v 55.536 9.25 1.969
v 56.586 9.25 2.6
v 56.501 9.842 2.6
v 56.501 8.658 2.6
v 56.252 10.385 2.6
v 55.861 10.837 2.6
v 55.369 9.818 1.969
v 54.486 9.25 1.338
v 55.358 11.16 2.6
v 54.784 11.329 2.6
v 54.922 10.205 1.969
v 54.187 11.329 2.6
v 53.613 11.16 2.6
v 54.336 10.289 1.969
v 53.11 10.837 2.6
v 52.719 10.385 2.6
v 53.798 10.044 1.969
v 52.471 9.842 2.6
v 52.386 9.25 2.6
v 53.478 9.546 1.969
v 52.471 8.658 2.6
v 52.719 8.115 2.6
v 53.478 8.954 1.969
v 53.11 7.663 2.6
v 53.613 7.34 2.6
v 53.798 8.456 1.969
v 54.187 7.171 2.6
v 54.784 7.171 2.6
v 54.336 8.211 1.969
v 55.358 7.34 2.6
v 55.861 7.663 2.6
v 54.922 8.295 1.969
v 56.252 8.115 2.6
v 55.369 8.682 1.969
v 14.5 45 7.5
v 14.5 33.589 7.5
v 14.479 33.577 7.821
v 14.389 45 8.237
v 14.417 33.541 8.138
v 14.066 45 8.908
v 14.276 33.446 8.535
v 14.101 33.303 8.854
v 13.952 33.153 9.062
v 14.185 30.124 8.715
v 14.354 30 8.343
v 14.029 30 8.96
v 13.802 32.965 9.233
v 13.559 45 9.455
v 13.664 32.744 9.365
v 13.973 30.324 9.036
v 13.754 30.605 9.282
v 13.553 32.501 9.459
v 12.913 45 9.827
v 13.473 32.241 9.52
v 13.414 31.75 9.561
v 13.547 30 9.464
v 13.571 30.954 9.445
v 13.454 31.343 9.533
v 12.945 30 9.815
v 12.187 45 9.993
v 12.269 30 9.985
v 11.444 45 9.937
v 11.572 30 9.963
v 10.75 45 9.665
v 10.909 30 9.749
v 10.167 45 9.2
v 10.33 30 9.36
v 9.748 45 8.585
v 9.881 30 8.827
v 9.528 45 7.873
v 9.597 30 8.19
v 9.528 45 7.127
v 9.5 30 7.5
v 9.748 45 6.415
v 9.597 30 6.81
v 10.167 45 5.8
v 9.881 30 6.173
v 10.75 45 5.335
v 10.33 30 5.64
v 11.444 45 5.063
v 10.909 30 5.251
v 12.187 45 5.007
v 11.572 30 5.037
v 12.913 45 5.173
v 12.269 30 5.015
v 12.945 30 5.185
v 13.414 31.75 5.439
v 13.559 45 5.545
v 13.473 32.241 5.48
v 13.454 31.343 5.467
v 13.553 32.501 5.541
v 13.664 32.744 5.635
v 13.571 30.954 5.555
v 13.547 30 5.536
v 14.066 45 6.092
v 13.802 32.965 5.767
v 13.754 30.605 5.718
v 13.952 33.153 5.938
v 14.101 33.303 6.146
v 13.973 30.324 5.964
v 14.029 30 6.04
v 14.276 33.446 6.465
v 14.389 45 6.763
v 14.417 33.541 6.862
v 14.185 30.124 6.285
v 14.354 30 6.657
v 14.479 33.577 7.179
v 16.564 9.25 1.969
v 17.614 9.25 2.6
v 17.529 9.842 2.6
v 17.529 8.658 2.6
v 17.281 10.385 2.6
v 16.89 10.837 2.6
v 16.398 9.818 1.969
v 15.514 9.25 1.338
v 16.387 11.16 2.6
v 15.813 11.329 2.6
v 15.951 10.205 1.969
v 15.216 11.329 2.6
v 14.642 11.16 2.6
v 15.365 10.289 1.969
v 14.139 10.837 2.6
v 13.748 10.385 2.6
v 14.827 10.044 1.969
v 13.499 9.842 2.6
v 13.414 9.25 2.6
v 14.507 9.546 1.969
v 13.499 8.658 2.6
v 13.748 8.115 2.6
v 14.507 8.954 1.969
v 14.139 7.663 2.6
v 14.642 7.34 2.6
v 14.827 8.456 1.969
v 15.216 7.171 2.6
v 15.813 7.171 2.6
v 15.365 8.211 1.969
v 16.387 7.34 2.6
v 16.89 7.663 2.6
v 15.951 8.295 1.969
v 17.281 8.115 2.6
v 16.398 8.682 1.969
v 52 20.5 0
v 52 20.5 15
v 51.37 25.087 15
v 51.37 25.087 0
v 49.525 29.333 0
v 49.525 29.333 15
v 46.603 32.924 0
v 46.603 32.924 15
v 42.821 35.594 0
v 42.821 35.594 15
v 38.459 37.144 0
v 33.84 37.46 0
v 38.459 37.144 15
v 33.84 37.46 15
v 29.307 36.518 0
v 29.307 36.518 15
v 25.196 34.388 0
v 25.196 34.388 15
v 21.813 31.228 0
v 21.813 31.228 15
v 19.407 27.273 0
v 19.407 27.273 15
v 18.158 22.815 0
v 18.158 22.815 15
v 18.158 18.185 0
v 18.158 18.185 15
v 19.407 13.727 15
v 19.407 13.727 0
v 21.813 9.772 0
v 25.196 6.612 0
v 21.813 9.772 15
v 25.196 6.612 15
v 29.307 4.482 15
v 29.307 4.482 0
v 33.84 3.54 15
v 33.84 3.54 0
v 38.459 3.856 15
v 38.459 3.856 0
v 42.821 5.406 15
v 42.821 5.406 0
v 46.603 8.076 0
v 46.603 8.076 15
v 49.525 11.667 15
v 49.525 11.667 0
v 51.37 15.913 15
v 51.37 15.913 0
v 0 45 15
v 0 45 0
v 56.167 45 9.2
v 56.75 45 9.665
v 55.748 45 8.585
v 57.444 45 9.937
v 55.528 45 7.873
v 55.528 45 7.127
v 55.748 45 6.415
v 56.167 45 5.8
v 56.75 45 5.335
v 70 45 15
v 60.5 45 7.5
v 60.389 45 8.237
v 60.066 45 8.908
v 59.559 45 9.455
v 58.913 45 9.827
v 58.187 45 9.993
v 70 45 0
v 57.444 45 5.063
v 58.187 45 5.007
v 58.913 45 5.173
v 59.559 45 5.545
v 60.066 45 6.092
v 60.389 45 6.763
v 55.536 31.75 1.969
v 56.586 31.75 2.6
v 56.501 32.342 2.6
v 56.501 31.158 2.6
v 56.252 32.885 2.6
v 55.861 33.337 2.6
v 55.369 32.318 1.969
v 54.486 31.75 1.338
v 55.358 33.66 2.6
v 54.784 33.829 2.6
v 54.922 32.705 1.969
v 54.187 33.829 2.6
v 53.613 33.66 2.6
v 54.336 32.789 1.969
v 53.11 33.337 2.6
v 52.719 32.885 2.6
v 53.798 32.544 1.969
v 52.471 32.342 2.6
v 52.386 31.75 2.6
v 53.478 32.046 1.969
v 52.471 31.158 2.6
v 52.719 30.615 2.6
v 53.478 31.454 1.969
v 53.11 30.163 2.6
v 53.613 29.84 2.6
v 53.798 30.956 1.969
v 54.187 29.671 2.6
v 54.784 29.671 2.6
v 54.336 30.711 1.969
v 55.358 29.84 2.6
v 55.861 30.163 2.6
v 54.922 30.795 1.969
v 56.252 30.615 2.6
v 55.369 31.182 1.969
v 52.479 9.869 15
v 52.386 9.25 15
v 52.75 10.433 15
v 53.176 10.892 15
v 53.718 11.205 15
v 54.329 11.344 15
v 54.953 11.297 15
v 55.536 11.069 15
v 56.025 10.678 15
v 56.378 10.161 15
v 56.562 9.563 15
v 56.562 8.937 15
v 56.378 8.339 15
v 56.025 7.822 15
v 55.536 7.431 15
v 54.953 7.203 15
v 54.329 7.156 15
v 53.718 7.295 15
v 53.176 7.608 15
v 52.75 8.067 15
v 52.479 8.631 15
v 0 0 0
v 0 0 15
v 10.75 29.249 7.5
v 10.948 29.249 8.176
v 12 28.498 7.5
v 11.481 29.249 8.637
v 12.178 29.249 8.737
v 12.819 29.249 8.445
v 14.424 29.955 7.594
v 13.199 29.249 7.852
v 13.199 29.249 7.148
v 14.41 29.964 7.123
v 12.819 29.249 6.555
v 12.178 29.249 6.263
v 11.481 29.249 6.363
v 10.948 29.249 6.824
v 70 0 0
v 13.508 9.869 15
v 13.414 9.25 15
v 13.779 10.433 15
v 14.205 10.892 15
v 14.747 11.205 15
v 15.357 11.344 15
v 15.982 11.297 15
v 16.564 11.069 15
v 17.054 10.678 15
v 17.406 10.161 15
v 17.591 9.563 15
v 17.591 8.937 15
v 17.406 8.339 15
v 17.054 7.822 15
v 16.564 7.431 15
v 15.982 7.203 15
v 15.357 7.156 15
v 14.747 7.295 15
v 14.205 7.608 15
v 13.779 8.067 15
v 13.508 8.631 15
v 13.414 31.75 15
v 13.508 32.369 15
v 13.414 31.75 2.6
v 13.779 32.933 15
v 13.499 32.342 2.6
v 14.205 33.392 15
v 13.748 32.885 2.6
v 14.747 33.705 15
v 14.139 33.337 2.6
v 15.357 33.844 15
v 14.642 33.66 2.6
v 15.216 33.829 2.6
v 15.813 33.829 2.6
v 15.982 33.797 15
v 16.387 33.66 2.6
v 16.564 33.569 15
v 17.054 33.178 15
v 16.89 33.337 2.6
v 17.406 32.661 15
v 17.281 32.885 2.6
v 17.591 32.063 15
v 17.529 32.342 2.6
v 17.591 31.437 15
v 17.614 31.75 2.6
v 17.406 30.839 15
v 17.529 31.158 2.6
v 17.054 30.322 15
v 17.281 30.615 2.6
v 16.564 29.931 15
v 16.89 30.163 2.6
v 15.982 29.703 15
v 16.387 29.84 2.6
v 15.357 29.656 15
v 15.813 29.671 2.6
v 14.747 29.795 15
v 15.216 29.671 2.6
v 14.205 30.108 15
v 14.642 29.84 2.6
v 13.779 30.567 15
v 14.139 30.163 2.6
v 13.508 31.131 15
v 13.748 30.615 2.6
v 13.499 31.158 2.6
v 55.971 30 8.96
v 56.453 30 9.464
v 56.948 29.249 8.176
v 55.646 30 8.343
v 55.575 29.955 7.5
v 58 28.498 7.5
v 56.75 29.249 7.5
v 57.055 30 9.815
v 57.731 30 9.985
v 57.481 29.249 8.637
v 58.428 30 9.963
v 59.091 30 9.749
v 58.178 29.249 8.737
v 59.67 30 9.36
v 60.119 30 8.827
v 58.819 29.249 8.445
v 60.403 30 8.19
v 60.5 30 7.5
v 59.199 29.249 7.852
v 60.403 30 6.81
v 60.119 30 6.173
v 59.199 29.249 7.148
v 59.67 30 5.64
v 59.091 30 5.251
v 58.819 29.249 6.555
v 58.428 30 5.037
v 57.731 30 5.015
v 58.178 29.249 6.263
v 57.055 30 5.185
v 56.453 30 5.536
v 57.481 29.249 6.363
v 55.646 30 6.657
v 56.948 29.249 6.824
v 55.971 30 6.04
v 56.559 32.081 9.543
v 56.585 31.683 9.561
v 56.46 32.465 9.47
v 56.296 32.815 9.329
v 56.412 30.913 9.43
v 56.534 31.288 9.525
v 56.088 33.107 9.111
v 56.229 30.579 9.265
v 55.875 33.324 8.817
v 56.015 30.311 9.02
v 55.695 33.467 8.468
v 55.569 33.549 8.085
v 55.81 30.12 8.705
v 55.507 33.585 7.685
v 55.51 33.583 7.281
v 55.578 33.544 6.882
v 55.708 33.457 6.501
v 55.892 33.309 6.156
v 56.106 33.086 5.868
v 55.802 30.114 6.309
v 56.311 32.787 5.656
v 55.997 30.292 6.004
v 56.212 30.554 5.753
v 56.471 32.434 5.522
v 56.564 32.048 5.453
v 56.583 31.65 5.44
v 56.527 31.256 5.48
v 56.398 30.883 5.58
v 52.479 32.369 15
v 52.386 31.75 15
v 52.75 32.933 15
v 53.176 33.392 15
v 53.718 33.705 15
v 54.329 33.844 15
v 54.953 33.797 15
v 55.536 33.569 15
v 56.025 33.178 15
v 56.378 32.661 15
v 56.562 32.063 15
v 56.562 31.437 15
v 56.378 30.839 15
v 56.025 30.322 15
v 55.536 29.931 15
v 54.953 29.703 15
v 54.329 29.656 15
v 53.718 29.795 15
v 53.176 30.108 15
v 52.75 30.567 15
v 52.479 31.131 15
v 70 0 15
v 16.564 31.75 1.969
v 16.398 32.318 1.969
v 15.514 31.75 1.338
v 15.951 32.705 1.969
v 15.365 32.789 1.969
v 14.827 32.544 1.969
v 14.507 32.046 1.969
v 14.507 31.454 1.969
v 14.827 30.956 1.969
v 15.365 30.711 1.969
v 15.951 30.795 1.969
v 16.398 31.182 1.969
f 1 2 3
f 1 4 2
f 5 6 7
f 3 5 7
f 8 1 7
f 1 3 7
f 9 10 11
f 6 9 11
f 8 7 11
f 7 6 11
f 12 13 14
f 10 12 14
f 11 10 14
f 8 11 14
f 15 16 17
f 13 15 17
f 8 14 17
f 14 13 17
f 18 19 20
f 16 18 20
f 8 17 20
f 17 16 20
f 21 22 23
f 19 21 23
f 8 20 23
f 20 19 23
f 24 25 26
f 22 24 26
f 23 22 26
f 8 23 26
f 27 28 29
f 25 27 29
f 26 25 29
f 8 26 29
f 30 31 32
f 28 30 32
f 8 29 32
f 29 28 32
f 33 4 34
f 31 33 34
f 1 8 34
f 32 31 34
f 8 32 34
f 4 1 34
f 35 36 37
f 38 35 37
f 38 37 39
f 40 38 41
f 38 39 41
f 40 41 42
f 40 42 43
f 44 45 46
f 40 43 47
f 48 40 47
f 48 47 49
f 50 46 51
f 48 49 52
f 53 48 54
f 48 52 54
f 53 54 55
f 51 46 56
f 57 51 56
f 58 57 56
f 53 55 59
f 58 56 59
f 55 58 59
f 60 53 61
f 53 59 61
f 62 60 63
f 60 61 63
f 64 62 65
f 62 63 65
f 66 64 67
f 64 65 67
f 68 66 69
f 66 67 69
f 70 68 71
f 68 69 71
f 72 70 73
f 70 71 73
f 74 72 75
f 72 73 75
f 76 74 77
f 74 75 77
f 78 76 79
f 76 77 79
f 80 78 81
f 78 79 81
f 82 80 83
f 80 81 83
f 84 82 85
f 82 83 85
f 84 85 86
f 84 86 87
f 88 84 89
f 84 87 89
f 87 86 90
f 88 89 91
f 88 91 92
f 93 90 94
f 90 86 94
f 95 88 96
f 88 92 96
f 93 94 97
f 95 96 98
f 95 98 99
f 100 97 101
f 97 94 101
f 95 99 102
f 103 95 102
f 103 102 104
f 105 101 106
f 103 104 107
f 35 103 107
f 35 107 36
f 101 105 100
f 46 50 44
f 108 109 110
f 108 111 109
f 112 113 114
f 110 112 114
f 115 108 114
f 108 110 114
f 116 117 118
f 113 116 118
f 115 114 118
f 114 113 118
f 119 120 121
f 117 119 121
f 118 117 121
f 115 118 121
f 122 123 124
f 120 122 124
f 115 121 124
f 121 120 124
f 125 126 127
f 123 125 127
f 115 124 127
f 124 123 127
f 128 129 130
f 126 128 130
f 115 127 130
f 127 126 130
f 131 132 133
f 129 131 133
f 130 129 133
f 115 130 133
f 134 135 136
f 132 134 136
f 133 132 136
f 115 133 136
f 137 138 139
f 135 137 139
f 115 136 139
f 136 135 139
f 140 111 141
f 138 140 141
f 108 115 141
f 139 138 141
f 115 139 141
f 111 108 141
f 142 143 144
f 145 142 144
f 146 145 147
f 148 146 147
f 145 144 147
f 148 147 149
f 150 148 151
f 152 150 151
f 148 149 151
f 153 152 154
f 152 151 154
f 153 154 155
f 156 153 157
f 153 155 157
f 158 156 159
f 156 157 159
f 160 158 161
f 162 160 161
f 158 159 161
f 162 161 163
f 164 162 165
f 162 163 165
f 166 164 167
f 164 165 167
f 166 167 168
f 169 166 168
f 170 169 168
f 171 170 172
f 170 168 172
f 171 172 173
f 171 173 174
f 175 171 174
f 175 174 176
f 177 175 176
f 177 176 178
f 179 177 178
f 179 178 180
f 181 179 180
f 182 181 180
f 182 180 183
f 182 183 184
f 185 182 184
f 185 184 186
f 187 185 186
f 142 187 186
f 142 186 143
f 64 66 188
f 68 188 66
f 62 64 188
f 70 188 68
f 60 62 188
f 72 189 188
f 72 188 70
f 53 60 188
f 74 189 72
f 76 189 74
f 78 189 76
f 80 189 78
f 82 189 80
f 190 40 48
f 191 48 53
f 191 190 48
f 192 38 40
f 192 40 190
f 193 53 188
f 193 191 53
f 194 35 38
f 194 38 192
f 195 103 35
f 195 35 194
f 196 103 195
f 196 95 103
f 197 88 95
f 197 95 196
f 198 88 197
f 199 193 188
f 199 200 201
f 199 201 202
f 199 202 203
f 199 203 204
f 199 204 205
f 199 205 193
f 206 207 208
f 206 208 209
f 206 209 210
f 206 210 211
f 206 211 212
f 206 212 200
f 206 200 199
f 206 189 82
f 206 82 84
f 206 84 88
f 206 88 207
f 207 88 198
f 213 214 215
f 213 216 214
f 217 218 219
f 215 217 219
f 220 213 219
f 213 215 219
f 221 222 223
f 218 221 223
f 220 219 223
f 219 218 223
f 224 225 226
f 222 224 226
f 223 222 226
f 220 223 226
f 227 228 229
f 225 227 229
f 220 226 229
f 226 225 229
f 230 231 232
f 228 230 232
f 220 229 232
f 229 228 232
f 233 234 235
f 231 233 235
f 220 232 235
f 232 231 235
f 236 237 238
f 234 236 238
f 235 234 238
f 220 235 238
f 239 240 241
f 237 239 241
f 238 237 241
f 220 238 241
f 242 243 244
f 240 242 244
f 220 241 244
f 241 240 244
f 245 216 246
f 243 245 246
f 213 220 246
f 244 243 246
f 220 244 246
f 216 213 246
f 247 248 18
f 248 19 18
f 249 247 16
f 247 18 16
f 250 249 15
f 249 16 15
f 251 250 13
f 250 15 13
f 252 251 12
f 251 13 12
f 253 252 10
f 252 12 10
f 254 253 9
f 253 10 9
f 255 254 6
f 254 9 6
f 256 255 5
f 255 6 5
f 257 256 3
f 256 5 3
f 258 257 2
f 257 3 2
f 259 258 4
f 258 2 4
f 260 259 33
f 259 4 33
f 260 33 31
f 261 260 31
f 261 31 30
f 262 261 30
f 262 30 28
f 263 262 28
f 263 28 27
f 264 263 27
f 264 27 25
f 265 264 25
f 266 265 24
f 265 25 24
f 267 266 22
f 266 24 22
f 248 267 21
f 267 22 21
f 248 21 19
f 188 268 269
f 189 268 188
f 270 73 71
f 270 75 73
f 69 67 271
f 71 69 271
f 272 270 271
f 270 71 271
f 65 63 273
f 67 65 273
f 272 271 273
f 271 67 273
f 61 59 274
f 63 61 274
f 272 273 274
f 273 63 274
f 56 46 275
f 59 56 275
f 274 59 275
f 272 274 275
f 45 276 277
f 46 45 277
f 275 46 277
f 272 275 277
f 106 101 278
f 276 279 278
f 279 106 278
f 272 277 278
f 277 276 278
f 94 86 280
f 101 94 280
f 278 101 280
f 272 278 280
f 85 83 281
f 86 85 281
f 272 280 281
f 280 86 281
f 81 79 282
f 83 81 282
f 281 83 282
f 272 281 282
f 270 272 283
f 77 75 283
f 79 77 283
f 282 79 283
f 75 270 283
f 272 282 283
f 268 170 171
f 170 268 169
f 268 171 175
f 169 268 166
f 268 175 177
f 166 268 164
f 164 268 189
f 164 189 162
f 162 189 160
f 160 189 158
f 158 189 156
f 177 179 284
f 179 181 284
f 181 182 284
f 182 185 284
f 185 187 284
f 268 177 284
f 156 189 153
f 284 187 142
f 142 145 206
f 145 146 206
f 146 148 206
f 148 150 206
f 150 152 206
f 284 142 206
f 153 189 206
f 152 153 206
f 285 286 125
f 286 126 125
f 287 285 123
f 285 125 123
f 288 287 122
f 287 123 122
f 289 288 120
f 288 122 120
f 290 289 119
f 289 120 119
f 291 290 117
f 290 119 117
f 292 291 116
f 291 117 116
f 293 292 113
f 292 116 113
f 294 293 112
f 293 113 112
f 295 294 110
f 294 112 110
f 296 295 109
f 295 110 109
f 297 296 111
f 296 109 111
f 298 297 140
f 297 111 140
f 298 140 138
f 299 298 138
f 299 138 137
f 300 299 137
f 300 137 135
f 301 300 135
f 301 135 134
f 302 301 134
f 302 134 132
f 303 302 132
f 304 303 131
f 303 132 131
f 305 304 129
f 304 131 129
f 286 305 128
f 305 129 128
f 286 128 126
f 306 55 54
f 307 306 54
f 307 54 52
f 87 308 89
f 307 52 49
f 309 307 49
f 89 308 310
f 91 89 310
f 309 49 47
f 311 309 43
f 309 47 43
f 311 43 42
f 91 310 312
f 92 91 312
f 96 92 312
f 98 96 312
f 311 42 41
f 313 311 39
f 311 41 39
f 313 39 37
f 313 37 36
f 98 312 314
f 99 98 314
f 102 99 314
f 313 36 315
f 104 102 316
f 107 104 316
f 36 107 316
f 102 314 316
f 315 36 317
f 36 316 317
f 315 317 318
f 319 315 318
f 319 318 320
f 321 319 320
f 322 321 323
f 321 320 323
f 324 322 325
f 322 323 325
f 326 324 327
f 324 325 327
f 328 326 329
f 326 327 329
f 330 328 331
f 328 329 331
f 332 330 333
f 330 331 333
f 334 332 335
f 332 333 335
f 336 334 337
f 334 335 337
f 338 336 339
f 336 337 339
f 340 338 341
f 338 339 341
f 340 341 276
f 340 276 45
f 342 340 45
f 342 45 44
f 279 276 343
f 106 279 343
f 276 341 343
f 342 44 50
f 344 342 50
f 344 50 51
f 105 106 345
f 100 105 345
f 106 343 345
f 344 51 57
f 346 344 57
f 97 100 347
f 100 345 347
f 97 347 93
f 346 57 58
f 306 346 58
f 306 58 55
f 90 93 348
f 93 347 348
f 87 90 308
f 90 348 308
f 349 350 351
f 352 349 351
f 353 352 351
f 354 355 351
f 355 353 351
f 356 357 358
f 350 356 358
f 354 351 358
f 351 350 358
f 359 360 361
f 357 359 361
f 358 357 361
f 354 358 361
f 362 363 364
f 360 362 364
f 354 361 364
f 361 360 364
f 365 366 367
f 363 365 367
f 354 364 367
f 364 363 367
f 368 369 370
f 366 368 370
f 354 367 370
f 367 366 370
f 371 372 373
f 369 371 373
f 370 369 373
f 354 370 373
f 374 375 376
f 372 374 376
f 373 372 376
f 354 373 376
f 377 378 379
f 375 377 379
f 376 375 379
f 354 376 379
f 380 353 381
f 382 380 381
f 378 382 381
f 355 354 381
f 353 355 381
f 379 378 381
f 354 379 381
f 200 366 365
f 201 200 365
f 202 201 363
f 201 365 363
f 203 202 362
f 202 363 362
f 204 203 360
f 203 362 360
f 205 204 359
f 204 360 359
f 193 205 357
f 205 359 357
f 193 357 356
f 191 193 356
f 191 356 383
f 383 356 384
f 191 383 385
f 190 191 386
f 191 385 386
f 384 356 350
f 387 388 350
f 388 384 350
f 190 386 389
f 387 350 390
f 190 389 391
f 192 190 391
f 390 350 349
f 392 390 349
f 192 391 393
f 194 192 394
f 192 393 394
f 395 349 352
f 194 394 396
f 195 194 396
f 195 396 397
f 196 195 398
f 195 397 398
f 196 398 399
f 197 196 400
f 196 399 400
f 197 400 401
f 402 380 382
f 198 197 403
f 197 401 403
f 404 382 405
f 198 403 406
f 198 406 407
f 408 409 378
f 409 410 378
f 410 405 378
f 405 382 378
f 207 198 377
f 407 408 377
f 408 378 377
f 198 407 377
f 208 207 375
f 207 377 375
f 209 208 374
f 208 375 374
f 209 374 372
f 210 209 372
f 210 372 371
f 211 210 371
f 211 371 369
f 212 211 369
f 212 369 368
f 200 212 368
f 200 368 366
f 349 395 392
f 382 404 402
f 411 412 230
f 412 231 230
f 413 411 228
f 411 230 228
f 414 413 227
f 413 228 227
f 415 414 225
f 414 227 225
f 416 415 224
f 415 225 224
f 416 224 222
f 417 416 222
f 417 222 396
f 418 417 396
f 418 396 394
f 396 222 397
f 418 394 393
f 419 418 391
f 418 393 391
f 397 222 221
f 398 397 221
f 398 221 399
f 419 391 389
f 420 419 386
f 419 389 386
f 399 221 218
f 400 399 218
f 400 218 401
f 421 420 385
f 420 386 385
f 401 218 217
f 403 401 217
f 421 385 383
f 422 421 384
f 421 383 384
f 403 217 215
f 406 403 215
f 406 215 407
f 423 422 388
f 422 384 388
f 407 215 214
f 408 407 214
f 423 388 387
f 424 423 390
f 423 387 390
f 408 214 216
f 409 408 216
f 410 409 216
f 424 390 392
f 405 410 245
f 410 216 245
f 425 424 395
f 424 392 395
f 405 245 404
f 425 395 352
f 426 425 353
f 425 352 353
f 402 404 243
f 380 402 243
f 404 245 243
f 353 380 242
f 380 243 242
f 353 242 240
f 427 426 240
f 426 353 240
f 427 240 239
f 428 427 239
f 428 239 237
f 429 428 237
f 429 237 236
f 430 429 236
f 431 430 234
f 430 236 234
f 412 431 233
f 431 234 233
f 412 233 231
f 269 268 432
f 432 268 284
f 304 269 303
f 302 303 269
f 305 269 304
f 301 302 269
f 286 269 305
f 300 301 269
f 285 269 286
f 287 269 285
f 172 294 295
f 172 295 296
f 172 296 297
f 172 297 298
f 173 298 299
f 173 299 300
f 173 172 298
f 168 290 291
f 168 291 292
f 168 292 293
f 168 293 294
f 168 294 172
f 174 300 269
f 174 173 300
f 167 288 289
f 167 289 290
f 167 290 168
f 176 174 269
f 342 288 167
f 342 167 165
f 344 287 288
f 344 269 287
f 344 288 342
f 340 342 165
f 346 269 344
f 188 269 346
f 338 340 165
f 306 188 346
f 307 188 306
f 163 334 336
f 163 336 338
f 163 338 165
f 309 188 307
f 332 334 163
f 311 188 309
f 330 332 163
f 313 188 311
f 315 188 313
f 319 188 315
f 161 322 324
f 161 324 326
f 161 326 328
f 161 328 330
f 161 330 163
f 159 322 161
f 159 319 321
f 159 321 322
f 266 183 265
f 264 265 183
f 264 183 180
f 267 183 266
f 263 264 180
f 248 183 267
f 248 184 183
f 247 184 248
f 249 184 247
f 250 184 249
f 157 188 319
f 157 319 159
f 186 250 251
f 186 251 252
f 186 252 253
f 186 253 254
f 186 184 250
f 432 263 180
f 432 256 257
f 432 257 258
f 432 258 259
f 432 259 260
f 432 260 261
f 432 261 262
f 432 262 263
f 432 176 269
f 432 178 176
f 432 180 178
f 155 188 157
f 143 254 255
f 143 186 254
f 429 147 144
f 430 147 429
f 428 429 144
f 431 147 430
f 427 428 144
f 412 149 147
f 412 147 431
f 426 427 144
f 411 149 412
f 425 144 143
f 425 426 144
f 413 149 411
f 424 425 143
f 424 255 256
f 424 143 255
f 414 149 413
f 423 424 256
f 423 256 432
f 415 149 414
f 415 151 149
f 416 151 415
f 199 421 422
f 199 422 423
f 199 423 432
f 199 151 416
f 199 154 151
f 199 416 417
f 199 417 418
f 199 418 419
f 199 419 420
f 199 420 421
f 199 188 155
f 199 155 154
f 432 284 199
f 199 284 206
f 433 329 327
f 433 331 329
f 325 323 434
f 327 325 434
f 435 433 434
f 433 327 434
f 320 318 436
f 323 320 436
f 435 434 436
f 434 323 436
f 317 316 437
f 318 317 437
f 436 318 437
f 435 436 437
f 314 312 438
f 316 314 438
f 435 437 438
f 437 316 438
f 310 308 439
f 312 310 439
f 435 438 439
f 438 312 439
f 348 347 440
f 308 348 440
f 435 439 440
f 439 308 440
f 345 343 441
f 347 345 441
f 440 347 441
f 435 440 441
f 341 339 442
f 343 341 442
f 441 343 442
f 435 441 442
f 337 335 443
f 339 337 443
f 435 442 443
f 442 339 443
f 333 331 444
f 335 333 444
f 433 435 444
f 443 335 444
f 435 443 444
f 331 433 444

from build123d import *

# Parameters (mm, degrees)
SKETCH_1_W             = 70
SKETCH_1_H             = 45
EXTRUDE_1_DEPTH        = 15
SKETCH_2_R             = 17
CUT_EXTRUDE_1_DEPTH    = 85.557672626
HOLE_WIZARD_M6_1_D     = 5
HOLE_WIZARD_M6_1_DEPTH = 15
HOLE_WIZARD_M6_1_TIP   = 1.502151548
HOLE_WIZARD_M5_1_D     = 4.2
HOLE_WIZARD_M5_1_DEPTH = 12.4
HOLE_WIZARD_M5_1_TIP   = 1.2618073


with BuildPart() as part:
    # 草图1 → 凸台-拉伸1 (new body)
    with BuildSketch(Plane.XY):
        with Locations((35, 22.5)):
            Rectangle(SKETCH_1_W, SKETCH_1_H)
    extrude(amount=EXTRUDE_1_DEPTH)

    # 草图2 → 切除-拉伸1 (cut, through all)
    with BuildSketch(Plane.XY.offset(15)):
        with Locations((35, 20.5)):
            Circle(SKETCH_2_R)
    extrude(amount=-CUT_EXTRUDE_1_DEPTH, mode=Mode.SUBTRACT)

    # M6 螺纹孔1
    with Locations(Plane(origin=(0, 45, 0), x_dir=(-1, 0, 0), z_dir=(0, 1, 0))):
        with Locations((-12, 7.5), (-58, 7.5)):
            Hole(HOLE_WIZARD_M6_1_D / 2, depth=HOLE_WIZARD_M6_1_DEPTH)
            with Locations((0, 0, -(HOLE_WIZARD_M6_1_DEPTH + HOLE_WIZARD_M6_1_TIP / 2))):  # 118° drill point
                Cone(0, HOLE_WIZARD_M6_1_D / 2, HOLE_WIZARD_M6_1_TIP, mode=Mode.SUBTRACT)

    # M5 螺纹孔1
    with Locations(Plane.XY.offset(15)):
        with Locations((54.485571585, 31.75), (15.514428415, 31.75), (54.485571585, 9.25), (15.514428415, 9.25)):
            Hole(HOLE_WIZARD_M5_1_D / 2, depth=HOLE_WIZARD_M5_1_DEPTH)
            with Locations((0, 0, -(HOLE_WIZARD_M5_1_DEPTH + HOLE_WIZARD_M5_1_TIP / 2))):  # 118° drill point
                Cone(0, HOLE_WIZARD_M5_1_D / 2, HOLE_WIZARD_M5_1_TIP, mode=Mode.SUBTRACT)


solid = part.part
